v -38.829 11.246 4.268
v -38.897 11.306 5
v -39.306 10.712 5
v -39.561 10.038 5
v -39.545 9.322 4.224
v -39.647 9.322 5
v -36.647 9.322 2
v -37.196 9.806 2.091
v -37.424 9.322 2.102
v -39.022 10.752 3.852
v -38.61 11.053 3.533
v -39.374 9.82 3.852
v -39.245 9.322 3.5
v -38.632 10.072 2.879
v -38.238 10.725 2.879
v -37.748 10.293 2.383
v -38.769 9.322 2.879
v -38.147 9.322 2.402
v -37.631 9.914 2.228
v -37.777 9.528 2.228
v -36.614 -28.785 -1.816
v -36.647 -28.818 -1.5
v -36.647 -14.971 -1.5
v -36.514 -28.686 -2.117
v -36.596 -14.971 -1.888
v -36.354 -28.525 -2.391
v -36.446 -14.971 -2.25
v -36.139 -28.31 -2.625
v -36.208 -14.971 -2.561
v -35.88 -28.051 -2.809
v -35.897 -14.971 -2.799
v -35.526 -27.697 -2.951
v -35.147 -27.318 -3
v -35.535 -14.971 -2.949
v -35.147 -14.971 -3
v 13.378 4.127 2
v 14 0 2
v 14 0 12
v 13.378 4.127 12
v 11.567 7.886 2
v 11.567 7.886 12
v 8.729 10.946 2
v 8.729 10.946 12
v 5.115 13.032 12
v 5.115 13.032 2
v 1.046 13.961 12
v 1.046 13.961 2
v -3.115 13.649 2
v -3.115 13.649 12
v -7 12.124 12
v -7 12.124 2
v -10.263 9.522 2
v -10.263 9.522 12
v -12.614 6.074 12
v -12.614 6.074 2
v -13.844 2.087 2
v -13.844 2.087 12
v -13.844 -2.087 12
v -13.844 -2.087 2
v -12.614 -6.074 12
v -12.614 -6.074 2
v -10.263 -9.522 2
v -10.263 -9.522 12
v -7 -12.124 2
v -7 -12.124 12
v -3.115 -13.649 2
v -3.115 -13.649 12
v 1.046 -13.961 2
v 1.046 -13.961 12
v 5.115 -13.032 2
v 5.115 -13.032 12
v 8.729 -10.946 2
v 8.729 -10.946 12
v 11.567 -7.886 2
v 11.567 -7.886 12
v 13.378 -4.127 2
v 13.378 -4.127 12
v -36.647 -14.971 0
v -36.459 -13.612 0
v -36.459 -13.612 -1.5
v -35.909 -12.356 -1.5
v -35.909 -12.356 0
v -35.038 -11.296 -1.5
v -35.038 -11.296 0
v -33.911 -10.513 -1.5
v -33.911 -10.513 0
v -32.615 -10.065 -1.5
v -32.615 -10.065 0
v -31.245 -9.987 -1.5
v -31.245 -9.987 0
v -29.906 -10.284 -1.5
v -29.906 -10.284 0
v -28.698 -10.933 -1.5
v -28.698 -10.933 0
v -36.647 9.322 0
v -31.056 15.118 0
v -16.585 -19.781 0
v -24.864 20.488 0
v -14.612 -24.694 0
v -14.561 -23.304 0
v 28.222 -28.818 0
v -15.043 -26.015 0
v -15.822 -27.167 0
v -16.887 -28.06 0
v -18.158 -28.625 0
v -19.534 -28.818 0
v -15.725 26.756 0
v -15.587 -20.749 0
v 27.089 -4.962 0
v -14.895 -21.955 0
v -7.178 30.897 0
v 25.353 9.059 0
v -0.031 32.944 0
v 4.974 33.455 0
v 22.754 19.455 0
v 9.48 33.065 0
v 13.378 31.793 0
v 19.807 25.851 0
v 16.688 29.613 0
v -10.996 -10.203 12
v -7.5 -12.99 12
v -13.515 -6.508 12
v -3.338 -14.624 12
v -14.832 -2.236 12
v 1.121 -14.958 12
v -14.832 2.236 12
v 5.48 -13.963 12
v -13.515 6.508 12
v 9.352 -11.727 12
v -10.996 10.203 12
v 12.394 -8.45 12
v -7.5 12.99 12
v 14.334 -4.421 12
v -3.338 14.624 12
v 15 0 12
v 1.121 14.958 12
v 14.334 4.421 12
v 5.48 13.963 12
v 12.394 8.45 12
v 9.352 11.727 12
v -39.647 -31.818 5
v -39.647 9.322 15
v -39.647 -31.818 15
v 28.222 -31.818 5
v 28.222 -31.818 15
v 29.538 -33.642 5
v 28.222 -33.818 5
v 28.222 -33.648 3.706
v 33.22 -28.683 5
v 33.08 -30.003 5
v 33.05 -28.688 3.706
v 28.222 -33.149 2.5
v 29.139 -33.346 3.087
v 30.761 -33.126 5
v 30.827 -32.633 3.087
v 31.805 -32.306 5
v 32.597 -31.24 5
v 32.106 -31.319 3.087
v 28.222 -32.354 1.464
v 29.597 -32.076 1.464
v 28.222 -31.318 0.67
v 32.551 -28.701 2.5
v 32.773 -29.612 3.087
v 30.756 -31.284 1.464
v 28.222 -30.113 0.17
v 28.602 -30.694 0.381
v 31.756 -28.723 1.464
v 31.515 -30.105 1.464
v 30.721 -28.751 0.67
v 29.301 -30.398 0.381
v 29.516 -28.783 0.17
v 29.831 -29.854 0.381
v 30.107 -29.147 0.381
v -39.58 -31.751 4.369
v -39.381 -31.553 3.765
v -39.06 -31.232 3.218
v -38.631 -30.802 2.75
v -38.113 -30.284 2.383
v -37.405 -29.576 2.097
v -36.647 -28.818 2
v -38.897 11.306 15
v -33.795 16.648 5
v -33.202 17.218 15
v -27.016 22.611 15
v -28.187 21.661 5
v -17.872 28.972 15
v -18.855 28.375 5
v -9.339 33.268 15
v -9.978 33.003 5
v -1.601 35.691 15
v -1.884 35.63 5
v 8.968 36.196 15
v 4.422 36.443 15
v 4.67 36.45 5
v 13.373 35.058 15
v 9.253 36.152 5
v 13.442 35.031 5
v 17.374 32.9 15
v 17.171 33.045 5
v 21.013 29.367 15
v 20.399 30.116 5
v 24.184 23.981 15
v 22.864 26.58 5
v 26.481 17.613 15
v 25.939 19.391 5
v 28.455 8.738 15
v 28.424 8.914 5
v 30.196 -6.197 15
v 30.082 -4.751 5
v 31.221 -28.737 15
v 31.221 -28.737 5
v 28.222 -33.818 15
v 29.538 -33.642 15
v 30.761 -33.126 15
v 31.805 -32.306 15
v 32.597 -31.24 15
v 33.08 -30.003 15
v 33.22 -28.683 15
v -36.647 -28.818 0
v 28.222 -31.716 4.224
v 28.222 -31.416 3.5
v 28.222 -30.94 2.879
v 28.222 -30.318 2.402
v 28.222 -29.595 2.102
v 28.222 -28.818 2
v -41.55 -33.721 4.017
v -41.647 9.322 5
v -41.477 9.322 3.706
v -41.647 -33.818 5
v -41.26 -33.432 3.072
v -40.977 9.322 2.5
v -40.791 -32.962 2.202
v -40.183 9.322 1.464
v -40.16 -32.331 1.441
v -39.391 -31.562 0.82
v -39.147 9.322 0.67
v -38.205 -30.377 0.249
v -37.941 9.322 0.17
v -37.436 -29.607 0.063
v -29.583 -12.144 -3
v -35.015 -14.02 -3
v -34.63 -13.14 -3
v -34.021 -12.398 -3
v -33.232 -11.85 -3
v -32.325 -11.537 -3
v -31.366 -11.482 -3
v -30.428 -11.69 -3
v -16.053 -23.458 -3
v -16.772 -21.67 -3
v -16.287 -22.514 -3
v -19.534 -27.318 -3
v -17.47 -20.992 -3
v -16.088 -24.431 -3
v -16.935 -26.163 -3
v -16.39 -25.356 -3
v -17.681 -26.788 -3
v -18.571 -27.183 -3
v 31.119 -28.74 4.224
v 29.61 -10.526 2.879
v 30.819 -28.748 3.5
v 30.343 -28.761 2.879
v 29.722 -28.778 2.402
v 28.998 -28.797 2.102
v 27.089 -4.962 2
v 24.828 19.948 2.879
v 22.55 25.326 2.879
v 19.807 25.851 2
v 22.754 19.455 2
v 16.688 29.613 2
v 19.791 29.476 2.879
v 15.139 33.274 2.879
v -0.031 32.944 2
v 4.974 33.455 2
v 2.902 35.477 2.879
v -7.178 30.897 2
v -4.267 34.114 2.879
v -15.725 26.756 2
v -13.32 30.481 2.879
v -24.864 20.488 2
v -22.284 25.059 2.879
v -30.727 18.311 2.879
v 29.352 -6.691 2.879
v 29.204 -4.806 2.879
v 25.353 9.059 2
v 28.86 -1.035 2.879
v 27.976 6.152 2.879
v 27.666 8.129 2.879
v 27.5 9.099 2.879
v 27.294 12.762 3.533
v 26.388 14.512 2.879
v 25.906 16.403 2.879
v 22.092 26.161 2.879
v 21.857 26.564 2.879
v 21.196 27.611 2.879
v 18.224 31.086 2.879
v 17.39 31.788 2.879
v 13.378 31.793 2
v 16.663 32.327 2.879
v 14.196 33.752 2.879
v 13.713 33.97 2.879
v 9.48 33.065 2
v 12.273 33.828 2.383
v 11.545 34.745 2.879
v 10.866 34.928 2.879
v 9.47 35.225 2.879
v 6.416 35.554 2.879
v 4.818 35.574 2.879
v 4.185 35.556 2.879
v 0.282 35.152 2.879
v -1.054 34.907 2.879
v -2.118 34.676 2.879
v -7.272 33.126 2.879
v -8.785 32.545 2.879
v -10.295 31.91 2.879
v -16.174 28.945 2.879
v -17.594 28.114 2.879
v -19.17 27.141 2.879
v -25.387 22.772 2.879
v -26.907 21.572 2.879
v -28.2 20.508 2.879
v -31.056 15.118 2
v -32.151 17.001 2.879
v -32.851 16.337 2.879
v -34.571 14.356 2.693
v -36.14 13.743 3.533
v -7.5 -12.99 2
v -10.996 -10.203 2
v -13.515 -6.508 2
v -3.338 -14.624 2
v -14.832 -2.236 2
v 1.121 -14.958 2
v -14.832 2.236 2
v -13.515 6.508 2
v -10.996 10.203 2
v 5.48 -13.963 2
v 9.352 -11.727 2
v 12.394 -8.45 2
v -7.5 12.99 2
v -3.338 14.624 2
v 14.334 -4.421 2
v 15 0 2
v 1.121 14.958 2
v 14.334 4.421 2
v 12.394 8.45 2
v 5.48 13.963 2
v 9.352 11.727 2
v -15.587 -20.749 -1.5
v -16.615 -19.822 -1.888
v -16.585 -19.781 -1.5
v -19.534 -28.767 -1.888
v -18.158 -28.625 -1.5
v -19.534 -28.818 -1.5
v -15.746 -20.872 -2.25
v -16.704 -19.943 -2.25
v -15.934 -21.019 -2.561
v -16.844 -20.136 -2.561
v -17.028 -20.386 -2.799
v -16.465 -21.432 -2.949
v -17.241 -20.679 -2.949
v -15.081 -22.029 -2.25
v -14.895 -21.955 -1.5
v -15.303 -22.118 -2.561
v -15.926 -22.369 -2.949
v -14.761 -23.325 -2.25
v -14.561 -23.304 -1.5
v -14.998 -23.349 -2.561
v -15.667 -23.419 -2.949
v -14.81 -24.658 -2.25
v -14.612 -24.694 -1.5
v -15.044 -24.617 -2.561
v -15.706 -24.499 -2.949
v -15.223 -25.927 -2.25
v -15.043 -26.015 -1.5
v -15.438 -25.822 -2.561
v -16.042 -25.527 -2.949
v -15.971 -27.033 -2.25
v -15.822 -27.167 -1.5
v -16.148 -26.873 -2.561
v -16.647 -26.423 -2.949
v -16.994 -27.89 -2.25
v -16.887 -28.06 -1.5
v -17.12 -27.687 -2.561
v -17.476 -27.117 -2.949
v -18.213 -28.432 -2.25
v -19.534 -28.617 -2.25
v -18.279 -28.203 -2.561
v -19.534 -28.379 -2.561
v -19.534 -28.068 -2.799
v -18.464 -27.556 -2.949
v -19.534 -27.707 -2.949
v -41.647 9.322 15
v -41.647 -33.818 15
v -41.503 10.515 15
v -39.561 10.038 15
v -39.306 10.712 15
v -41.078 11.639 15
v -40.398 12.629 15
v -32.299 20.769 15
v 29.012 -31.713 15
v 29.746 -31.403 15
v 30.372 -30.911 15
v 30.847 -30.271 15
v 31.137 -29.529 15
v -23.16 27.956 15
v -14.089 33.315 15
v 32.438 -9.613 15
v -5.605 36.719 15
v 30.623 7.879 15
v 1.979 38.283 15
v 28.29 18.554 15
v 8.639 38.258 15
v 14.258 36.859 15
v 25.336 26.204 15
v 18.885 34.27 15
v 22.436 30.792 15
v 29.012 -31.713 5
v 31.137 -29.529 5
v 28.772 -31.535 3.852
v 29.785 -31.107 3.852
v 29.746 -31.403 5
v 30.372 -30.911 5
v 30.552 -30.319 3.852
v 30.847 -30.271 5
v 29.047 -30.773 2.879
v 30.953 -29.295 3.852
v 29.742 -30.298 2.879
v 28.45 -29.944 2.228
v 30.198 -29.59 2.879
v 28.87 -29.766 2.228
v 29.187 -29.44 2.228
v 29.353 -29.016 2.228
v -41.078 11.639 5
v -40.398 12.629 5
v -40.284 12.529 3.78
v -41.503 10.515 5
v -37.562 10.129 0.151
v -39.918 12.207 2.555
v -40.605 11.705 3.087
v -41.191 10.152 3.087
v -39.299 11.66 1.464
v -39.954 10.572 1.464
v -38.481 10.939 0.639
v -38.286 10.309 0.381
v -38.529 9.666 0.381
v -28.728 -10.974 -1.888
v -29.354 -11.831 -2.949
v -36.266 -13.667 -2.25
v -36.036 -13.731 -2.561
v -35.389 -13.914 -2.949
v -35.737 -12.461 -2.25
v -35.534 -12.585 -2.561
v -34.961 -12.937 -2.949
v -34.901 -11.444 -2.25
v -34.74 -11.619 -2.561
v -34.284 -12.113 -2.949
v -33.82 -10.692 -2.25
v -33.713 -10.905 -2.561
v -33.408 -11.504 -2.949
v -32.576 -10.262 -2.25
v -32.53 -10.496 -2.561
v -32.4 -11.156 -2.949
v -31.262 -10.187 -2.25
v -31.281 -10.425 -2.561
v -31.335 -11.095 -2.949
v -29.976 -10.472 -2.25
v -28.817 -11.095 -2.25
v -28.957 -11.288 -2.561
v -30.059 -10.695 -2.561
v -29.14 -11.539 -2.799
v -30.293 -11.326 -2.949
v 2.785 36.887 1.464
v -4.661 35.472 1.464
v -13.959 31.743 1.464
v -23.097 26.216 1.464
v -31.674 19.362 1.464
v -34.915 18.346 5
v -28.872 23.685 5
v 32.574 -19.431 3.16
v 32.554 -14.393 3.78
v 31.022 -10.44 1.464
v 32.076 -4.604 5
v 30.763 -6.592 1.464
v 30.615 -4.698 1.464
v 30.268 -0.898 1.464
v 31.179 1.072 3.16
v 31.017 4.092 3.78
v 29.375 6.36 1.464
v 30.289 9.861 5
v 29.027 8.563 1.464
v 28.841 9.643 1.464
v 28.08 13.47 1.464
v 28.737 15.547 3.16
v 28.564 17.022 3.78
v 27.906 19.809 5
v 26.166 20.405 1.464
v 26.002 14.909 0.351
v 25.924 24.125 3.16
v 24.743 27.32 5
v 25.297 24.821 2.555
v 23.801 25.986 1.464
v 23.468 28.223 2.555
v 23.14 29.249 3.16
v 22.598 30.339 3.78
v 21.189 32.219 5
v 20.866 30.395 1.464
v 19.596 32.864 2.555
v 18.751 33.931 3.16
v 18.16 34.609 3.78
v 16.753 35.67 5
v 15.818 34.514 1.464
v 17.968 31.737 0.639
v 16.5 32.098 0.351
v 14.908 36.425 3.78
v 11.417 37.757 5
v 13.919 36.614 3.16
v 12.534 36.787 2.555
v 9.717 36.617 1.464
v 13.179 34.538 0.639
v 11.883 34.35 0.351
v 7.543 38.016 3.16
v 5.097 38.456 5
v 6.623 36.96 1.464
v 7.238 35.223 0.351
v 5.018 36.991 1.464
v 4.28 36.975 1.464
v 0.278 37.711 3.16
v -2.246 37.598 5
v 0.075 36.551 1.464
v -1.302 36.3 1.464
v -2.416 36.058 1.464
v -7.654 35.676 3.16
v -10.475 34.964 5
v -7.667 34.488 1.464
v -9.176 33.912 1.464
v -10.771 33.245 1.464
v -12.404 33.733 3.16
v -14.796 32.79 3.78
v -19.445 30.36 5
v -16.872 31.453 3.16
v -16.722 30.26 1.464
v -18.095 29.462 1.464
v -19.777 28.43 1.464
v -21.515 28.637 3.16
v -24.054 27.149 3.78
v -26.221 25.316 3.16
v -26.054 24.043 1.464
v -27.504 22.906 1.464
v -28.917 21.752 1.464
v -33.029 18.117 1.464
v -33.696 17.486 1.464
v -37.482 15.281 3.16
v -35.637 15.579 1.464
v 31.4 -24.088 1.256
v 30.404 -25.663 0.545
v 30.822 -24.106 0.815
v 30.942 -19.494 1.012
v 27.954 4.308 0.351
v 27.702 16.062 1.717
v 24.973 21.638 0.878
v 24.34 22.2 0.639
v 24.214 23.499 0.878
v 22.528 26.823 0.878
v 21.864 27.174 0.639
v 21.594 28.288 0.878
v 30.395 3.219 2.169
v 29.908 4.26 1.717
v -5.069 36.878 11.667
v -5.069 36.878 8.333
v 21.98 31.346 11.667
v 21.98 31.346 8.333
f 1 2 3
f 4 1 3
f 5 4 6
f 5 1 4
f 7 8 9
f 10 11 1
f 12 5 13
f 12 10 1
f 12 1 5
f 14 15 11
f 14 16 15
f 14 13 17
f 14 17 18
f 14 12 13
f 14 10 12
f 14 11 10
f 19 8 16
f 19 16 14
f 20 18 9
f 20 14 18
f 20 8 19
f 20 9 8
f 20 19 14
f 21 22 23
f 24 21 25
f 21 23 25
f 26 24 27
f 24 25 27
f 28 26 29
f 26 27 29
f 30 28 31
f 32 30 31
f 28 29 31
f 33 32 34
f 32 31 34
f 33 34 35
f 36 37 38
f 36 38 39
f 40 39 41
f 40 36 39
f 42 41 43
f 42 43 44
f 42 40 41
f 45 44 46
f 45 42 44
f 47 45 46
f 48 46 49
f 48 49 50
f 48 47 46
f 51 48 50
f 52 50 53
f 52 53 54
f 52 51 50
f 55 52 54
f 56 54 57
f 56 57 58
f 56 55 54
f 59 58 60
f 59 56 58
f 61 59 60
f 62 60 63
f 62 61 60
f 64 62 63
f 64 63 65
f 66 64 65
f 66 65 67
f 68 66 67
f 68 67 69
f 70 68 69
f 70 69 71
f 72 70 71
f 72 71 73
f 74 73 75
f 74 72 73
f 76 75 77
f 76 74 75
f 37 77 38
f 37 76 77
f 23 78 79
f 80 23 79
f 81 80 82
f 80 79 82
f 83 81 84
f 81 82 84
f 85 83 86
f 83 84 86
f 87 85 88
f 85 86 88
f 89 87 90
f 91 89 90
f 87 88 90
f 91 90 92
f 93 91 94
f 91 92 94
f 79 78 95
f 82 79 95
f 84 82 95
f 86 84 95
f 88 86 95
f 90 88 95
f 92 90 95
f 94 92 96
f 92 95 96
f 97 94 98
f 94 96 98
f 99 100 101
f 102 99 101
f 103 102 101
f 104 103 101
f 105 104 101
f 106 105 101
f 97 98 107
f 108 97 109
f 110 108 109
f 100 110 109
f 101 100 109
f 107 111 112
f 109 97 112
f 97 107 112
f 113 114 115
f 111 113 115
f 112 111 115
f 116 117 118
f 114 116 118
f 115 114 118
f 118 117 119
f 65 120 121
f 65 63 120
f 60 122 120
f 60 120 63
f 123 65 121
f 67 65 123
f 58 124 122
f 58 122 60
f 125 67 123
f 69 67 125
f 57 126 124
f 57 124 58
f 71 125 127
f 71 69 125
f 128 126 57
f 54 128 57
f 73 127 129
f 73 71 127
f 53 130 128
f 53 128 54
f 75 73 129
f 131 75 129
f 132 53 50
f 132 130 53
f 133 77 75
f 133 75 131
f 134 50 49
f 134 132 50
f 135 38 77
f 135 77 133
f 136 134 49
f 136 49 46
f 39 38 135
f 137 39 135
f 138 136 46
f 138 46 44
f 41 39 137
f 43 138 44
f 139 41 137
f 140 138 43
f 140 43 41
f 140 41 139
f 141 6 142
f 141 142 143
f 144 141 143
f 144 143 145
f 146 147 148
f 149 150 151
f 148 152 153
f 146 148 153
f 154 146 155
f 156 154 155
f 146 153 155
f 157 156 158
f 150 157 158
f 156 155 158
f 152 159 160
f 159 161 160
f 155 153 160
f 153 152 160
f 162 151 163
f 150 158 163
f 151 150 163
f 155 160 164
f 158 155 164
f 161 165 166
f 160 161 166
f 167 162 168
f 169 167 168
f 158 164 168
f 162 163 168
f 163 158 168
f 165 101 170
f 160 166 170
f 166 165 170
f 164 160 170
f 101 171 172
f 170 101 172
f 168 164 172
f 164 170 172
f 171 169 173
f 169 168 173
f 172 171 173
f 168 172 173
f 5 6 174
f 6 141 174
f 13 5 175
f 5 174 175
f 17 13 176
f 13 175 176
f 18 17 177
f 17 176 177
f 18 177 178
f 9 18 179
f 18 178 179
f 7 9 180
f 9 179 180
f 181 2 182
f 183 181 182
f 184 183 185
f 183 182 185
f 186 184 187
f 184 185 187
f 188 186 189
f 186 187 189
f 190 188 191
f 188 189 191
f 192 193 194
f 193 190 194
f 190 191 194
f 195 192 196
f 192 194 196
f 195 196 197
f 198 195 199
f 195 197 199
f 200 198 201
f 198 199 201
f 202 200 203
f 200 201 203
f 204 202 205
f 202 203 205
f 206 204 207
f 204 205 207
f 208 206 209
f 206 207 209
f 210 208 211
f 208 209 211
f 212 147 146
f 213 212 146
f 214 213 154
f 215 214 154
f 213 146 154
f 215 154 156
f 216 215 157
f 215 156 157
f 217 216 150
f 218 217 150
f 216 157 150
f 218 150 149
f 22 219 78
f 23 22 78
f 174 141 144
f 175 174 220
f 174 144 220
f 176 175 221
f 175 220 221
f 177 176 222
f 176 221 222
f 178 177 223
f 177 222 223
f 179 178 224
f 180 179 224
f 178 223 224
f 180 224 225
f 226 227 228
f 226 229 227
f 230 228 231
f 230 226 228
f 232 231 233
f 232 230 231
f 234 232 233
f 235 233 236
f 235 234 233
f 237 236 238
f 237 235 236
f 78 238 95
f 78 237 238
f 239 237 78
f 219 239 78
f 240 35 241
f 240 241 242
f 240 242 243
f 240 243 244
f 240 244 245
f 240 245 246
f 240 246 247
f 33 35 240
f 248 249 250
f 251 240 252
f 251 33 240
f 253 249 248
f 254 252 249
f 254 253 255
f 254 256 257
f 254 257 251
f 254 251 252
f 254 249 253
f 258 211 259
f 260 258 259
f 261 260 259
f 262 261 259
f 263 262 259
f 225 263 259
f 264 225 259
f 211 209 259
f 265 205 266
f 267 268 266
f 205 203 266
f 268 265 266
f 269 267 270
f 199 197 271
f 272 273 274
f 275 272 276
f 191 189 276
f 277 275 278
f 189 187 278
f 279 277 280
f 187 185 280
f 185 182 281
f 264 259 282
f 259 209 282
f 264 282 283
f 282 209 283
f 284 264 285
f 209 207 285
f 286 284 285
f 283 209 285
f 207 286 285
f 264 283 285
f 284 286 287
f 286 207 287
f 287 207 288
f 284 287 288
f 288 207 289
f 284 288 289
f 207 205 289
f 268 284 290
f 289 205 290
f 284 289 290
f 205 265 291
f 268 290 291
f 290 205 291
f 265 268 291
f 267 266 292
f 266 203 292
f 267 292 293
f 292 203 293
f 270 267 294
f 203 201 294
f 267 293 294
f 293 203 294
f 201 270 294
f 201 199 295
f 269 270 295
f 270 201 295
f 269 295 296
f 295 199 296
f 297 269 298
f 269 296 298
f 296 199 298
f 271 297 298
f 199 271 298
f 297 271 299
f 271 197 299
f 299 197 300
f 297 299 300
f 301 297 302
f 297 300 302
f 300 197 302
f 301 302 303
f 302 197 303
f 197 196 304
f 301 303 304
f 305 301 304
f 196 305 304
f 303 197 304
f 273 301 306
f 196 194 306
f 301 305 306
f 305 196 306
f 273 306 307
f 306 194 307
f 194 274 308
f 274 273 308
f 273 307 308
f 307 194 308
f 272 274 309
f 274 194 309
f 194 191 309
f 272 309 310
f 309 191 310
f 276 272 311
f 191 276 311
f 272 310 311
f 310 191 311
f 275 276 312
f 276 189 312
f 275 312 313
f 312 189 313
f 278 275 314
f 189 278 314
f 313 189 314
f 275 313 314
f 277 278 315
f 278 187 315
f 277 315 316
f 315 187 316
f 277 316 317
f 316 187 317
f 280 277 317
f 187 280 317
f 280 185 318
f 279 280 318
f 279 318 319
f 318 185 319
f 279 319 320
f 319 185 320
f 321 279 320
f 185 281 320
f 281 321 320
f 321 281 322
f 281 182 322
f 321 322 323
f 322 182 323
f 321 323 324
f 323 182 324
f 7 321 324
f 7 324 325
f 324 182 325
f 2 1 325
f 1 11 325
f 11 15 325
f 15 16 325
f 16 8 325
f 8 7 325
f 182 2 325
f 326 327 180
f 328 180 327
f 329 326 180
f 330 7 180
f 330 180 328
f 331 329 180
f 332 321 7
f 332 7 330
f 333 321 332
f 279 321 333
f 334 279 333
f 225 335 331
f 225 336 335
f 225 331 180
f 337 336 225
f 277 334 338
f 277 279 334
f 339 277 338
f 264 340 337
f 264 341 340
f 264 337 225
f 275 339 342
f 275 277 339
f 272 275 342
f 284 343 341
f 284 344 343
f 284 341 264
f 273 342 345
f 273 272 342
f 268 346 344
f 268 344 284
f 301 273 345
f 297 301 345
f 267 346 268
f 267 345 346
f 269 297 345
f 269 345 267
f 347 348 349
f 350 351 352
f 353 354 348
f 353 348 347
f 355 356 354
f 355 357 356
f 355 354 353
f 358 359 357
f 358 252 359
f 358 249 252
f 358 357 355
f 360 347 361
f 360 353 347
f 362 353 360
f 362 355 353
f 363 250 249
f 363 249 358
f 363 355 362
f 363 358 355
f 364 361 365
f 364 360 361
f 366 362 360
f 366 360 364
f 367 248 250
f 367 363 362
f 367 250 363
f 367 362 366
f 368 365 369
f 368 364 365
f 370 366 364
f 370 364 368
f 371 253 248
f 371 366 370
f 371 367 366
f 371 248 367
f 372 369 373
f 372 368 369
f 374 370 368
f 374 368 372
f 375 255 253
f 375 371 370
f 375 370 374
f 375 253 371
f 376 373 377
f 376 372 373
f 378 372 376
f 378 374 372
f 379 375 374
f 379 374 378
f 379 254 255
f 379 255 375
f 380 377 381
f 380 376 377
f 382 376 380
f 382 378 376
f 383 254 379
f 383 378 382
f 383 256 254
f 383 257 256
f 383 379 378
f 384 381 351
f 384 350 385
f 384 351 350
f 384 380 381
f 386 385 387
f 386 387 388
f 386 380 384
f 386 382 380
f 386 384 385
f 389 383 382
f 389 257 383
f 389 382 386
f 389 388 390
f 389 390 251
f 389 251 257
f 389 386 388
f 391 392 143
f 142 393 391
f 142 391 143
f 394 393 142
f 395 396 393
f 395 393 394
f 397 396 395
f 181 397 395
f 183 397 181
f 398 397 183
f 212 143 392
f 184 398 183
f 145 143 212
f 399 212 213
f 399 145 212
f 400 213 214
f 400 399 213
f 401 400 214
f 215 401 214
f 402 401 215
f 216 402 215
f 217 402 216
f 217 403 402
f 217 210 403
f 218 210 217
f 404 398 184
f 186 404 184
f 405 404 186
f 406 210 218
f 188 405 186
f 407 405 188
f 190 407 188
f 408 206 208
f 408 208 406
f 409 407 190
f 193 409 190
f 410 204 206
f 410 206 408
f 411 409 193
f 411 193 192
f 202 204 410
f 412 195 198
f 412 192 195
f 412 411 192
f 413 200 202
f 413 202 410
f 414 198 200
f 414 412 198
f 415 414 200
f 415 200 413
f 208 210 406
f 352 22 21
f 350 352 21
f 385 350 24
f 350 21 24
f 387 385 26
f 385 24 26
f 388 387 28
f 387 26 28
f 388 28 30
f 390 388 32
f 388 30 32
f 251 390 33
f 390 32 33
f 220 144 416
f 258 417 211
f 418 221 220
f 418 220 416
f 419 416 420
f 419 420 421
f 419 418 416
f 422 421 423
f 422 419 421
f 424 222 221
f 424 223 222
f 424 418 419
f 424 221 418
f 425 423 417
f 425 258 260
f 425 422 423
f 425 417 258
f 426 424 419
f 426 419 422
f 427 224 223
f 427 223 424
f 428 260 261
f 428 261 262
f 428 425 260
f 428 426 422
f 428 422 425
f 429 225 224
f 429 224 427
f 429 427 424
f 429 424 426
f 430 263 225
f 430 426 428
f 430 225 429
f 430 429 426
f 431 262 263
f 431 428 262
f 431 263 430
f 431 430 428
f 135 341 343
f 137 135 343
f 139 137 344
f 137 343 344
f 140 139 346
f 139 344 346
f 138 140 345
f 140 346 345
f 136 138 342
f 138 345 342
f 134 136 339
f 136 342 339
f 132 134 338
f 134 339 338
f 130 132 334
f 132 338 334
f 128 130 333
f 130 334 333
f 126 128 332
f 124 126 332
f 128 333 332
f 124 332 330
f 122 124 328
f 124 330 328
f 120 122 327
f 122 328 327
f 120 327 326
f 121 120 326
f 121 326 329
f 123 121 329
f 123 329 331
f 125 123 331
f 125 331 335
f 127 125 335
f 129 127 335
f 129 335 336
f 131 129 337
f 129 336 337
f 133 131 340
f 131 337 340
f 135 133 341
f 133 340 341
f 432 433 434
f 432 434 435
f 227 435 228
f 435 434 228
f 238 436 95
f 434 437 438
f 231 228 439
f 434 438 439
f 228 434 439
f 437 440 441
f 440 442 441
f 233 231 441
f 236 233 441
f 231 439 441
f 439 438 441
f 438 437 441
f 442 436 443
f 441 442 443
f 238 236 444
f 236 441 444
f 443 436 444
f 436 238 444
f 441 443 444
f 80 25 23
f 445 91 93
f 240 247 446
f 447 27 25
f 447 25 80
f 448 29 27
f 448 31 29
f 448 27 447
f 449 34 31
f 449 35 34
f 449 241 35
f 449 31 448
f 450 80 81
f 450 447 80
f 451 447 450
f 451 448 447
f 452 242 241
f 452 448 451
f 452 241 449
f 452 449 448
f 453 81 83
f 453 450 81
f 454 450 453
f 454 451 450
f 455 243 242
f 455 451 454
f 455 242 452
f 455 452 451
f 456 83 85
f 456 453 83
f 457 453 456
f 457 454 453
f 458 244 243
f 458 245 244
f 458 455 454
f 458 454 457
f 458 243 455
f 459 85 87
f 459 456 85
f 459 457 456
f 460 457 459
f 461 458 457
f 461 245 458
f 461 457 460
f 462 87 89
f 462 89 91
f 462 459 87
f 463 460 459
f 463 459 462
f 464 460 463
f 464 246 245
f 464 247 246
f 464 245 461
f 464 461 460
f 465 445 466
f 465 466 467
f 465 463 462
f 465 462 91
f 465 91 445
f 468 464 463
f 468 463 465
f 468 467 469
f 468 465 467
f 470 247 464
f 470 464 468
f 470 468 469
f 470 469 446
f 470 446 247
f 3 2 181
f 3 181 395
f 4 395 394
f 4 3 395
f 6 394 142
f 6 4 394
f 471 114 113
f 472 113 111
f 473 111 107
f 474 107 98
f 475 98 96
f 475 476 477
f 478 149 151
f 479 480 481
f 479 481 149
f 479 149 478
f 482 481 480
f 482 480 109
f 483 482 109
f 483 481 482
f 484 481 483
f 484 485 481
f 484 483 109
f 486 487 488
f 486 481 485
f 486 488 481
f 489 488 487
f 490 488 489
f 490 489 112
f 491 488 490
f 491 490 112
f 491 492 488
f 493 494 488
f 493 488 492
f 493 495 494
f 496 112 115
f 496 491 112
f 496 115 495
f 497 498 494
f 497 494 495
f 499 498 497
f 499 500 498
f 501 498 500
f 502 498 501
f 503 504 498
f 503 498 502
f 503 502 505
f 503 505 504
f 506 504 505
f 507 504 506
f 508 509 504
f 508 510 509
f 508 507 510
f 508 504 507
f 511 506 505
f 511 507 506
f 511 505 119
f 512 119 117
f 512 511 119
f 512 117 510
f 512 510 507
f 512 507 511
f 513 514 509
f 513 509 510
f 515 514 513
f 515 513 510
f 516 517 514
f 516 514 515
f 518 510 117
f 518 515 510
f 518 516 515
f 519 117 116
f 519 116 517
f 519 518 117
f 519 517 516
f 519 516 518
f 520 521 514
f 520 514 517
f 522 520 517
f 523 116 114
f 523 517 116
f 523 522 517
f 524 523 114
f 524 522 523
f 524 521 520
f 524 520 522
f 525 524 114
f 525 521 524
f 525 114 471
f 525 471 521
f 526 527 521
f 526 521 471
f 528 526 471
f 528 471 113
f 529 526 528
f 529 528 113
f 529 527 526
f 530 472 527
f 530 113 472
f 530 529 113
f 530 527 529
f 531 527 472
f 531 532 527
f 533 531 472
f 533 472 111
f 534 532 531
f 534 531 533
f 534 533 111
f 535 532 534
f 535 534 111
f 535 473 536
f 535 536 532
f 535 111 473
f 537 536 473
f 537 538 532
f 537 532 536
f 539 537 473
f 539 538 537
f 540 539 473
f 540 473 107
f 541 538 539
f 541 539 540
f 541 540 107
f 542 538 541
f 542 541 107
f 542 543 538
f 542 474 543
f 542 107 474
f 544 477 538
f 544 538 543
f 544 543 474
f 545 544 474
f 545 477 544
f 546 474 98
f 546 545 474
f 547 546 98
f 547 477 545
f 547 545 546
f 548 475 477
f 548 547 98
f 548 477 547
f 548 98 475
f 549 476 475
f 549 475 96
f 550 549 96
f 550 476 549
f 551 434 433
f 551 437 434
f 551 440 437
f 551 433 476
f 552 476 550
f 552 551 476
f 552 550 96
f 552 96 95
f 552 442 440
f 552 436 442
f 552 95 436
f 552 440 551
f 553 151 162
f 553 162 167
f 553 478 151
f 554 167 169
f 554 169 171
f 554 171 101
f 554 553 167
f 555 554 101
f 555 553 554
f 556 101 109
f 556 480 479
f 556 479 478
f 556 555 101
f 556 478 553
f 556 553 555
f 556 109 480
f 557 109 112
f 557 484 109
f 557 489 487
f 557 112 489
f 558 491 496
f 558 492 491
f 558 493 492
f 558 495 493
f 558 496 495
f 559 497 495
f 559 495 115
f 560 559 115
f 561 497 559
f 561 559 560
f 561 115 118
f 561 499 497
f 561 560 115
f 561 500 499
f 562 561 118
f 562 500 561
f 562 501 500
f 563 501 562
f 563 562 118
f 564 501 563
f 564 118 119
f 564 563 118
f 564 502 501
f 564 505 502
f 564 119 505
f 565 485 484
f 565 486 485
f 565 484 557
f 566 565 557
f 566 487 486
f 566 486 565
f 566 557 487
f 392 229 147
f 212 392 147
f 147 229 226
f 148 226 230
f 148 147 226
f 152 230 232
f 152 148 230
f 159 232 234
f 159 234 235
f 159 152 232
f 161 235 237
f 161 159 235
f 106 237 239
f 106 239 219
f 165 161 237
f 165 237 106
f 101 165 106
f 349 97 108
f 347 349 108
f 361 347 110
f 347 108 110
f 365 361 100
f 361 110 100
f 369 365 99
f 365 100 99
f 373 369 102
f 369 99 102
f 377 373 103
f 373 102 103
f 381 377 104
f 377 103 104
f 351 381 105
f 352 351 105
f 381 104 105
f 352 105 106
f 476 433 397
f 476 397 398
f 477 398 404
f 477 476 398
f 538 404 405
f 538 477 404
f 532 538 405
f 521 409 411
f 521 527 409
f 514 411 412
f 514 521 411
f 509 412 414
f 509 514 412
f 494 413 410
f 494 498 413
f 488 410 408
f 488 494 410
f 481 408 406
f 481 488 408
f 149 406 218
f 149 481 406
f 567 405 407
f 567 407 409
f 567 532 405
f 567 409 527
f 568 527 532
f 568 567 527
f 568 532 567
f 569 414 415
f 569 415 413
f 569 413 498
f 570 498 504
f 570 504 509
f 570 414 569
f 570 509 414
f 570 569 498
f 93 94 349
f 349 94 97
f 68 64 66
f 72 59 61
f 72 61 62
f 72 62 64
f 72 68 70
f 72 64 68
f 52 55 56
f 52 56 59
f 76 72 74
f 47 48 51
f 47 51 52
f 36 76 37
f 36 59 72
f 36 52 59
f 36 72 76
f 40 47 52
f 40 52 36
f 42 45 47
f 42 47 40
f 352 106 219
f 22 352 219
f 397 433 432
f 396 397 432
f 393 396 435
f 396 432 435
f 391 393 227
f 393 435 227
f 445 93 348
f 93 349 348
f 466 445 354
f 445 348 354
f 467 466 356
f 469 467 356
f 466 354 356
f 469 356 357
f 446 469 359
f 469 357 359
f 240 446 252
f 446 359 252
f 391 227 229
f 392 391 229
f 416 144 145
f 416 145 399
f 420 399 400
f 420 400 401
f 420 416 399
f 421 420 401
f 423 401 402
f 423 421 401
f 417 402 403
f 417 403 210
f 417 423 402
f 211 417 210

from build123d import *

# Parameters (mm, degrees)
F1_DEPTH = 15
F2_R     = 5
F3_T     = -2
F4_R     = 15
F4_R_2   = 14
F5_DEPTH = 10
F7_DEPTH = 3
F8_R     = 1.5


with BuildPart() as f1:
    # F0 (on Top) → F1 (new body)
    with BuildSketch(Plane.XY):
        with BuildLine():
            Line((-41.6471999139, -33.8184056139), (28.2221867927, -33.8184056139))
            ThreePointArc((28.2221867927, -33.8184056139), (31.8052461555, -32.3057664503), (33.2203551511, -28.683079855))
            add(Edge.make_bspline(
                [(-40.3975011, 12.6290499162), (-30.8858296108, 23.4162518808), (-7.0493723569, 41.208289187), (30.3520223055, 37.2959686123), (32.5478684018, -3.8452218026), (33.2203551511, -28.683079855)],
                knots=[0.0142068322, 0.0142068322, 0.0142068322, 0.0142068322, 0.3330718044, 0.5948309974, 0.9738907257, 0.9738907257, 0.9738907257, 0.9738907257], degree=3))
            ThreePointArc((-40.3975011, 12.6290499162), (-41.324352142, 11.089756291), (-41.6471999139, 9.3222023217))
            Line((-41.6471999139, 9.3222023217), (-41.6471999139, -33.8184056139))
        make_face()
    extrude(amount=F1_DEPTH)

    # F2
    f2_edges = [f1.edges().sort_by_distance(p)[0] for p in [
        (-41.6472, -12.248102, 0),
    ]]
    fillet(f2_edges, radius=F2_R)

    # F3
    f3_openings = [f1.faces().sort_by_distance(p)[0] for p in [
        (-3.826347, -1.622162, 15),
    ]]
    offset(amount=F3_T, openings=f3_openings)

    # F4 (on face) → F5 (join)
    with BuildSketch(Plane.XY.offset(2)):
        Circle(F4_R)
        Circle(F4_R_2, mode=Mode.SUBTRACT)
    extrude(amount=F5_DEPTH)

    # F6 (on face) → F7 (join)
    with BuildSketch(Plane(origin=(0, 0, 0), x_dir=(1, 0, 0), z_dir=(0, 0, -1))):
        with BuildLine():
            Line((-19.5344565624, 28.8184056139), (-36.6471999139, 28.8184056139))
            Line((-36.6471999139, 28.8184056139), (-36.6471999139, 14.9707252116))
            ThreePointArc((-36.6471999139, 14.9707252116), (-33.911473086, 10.5128033861), (-28.6979731131, 10.9331440944))
            Line((-28.6979731131, 10.9331440944), (-16.5852297616, 19.7808244968))
            ThreePointArc((-16.5852297616, 19.7808244968), (-14.7811468952, 25.3695494523), (-19.5344565624, 28.8184056139))
        make_face()
    extrude(amount=F7_DEPTH)

    # F8
    f8_edges = [f1.edges().sort_by_distance(p)[0] for p in [
        (-28.090828, -28.818406, -3),
    ]]
    fillet(f8_edges, radius=F8_R)


solid = f1.part
